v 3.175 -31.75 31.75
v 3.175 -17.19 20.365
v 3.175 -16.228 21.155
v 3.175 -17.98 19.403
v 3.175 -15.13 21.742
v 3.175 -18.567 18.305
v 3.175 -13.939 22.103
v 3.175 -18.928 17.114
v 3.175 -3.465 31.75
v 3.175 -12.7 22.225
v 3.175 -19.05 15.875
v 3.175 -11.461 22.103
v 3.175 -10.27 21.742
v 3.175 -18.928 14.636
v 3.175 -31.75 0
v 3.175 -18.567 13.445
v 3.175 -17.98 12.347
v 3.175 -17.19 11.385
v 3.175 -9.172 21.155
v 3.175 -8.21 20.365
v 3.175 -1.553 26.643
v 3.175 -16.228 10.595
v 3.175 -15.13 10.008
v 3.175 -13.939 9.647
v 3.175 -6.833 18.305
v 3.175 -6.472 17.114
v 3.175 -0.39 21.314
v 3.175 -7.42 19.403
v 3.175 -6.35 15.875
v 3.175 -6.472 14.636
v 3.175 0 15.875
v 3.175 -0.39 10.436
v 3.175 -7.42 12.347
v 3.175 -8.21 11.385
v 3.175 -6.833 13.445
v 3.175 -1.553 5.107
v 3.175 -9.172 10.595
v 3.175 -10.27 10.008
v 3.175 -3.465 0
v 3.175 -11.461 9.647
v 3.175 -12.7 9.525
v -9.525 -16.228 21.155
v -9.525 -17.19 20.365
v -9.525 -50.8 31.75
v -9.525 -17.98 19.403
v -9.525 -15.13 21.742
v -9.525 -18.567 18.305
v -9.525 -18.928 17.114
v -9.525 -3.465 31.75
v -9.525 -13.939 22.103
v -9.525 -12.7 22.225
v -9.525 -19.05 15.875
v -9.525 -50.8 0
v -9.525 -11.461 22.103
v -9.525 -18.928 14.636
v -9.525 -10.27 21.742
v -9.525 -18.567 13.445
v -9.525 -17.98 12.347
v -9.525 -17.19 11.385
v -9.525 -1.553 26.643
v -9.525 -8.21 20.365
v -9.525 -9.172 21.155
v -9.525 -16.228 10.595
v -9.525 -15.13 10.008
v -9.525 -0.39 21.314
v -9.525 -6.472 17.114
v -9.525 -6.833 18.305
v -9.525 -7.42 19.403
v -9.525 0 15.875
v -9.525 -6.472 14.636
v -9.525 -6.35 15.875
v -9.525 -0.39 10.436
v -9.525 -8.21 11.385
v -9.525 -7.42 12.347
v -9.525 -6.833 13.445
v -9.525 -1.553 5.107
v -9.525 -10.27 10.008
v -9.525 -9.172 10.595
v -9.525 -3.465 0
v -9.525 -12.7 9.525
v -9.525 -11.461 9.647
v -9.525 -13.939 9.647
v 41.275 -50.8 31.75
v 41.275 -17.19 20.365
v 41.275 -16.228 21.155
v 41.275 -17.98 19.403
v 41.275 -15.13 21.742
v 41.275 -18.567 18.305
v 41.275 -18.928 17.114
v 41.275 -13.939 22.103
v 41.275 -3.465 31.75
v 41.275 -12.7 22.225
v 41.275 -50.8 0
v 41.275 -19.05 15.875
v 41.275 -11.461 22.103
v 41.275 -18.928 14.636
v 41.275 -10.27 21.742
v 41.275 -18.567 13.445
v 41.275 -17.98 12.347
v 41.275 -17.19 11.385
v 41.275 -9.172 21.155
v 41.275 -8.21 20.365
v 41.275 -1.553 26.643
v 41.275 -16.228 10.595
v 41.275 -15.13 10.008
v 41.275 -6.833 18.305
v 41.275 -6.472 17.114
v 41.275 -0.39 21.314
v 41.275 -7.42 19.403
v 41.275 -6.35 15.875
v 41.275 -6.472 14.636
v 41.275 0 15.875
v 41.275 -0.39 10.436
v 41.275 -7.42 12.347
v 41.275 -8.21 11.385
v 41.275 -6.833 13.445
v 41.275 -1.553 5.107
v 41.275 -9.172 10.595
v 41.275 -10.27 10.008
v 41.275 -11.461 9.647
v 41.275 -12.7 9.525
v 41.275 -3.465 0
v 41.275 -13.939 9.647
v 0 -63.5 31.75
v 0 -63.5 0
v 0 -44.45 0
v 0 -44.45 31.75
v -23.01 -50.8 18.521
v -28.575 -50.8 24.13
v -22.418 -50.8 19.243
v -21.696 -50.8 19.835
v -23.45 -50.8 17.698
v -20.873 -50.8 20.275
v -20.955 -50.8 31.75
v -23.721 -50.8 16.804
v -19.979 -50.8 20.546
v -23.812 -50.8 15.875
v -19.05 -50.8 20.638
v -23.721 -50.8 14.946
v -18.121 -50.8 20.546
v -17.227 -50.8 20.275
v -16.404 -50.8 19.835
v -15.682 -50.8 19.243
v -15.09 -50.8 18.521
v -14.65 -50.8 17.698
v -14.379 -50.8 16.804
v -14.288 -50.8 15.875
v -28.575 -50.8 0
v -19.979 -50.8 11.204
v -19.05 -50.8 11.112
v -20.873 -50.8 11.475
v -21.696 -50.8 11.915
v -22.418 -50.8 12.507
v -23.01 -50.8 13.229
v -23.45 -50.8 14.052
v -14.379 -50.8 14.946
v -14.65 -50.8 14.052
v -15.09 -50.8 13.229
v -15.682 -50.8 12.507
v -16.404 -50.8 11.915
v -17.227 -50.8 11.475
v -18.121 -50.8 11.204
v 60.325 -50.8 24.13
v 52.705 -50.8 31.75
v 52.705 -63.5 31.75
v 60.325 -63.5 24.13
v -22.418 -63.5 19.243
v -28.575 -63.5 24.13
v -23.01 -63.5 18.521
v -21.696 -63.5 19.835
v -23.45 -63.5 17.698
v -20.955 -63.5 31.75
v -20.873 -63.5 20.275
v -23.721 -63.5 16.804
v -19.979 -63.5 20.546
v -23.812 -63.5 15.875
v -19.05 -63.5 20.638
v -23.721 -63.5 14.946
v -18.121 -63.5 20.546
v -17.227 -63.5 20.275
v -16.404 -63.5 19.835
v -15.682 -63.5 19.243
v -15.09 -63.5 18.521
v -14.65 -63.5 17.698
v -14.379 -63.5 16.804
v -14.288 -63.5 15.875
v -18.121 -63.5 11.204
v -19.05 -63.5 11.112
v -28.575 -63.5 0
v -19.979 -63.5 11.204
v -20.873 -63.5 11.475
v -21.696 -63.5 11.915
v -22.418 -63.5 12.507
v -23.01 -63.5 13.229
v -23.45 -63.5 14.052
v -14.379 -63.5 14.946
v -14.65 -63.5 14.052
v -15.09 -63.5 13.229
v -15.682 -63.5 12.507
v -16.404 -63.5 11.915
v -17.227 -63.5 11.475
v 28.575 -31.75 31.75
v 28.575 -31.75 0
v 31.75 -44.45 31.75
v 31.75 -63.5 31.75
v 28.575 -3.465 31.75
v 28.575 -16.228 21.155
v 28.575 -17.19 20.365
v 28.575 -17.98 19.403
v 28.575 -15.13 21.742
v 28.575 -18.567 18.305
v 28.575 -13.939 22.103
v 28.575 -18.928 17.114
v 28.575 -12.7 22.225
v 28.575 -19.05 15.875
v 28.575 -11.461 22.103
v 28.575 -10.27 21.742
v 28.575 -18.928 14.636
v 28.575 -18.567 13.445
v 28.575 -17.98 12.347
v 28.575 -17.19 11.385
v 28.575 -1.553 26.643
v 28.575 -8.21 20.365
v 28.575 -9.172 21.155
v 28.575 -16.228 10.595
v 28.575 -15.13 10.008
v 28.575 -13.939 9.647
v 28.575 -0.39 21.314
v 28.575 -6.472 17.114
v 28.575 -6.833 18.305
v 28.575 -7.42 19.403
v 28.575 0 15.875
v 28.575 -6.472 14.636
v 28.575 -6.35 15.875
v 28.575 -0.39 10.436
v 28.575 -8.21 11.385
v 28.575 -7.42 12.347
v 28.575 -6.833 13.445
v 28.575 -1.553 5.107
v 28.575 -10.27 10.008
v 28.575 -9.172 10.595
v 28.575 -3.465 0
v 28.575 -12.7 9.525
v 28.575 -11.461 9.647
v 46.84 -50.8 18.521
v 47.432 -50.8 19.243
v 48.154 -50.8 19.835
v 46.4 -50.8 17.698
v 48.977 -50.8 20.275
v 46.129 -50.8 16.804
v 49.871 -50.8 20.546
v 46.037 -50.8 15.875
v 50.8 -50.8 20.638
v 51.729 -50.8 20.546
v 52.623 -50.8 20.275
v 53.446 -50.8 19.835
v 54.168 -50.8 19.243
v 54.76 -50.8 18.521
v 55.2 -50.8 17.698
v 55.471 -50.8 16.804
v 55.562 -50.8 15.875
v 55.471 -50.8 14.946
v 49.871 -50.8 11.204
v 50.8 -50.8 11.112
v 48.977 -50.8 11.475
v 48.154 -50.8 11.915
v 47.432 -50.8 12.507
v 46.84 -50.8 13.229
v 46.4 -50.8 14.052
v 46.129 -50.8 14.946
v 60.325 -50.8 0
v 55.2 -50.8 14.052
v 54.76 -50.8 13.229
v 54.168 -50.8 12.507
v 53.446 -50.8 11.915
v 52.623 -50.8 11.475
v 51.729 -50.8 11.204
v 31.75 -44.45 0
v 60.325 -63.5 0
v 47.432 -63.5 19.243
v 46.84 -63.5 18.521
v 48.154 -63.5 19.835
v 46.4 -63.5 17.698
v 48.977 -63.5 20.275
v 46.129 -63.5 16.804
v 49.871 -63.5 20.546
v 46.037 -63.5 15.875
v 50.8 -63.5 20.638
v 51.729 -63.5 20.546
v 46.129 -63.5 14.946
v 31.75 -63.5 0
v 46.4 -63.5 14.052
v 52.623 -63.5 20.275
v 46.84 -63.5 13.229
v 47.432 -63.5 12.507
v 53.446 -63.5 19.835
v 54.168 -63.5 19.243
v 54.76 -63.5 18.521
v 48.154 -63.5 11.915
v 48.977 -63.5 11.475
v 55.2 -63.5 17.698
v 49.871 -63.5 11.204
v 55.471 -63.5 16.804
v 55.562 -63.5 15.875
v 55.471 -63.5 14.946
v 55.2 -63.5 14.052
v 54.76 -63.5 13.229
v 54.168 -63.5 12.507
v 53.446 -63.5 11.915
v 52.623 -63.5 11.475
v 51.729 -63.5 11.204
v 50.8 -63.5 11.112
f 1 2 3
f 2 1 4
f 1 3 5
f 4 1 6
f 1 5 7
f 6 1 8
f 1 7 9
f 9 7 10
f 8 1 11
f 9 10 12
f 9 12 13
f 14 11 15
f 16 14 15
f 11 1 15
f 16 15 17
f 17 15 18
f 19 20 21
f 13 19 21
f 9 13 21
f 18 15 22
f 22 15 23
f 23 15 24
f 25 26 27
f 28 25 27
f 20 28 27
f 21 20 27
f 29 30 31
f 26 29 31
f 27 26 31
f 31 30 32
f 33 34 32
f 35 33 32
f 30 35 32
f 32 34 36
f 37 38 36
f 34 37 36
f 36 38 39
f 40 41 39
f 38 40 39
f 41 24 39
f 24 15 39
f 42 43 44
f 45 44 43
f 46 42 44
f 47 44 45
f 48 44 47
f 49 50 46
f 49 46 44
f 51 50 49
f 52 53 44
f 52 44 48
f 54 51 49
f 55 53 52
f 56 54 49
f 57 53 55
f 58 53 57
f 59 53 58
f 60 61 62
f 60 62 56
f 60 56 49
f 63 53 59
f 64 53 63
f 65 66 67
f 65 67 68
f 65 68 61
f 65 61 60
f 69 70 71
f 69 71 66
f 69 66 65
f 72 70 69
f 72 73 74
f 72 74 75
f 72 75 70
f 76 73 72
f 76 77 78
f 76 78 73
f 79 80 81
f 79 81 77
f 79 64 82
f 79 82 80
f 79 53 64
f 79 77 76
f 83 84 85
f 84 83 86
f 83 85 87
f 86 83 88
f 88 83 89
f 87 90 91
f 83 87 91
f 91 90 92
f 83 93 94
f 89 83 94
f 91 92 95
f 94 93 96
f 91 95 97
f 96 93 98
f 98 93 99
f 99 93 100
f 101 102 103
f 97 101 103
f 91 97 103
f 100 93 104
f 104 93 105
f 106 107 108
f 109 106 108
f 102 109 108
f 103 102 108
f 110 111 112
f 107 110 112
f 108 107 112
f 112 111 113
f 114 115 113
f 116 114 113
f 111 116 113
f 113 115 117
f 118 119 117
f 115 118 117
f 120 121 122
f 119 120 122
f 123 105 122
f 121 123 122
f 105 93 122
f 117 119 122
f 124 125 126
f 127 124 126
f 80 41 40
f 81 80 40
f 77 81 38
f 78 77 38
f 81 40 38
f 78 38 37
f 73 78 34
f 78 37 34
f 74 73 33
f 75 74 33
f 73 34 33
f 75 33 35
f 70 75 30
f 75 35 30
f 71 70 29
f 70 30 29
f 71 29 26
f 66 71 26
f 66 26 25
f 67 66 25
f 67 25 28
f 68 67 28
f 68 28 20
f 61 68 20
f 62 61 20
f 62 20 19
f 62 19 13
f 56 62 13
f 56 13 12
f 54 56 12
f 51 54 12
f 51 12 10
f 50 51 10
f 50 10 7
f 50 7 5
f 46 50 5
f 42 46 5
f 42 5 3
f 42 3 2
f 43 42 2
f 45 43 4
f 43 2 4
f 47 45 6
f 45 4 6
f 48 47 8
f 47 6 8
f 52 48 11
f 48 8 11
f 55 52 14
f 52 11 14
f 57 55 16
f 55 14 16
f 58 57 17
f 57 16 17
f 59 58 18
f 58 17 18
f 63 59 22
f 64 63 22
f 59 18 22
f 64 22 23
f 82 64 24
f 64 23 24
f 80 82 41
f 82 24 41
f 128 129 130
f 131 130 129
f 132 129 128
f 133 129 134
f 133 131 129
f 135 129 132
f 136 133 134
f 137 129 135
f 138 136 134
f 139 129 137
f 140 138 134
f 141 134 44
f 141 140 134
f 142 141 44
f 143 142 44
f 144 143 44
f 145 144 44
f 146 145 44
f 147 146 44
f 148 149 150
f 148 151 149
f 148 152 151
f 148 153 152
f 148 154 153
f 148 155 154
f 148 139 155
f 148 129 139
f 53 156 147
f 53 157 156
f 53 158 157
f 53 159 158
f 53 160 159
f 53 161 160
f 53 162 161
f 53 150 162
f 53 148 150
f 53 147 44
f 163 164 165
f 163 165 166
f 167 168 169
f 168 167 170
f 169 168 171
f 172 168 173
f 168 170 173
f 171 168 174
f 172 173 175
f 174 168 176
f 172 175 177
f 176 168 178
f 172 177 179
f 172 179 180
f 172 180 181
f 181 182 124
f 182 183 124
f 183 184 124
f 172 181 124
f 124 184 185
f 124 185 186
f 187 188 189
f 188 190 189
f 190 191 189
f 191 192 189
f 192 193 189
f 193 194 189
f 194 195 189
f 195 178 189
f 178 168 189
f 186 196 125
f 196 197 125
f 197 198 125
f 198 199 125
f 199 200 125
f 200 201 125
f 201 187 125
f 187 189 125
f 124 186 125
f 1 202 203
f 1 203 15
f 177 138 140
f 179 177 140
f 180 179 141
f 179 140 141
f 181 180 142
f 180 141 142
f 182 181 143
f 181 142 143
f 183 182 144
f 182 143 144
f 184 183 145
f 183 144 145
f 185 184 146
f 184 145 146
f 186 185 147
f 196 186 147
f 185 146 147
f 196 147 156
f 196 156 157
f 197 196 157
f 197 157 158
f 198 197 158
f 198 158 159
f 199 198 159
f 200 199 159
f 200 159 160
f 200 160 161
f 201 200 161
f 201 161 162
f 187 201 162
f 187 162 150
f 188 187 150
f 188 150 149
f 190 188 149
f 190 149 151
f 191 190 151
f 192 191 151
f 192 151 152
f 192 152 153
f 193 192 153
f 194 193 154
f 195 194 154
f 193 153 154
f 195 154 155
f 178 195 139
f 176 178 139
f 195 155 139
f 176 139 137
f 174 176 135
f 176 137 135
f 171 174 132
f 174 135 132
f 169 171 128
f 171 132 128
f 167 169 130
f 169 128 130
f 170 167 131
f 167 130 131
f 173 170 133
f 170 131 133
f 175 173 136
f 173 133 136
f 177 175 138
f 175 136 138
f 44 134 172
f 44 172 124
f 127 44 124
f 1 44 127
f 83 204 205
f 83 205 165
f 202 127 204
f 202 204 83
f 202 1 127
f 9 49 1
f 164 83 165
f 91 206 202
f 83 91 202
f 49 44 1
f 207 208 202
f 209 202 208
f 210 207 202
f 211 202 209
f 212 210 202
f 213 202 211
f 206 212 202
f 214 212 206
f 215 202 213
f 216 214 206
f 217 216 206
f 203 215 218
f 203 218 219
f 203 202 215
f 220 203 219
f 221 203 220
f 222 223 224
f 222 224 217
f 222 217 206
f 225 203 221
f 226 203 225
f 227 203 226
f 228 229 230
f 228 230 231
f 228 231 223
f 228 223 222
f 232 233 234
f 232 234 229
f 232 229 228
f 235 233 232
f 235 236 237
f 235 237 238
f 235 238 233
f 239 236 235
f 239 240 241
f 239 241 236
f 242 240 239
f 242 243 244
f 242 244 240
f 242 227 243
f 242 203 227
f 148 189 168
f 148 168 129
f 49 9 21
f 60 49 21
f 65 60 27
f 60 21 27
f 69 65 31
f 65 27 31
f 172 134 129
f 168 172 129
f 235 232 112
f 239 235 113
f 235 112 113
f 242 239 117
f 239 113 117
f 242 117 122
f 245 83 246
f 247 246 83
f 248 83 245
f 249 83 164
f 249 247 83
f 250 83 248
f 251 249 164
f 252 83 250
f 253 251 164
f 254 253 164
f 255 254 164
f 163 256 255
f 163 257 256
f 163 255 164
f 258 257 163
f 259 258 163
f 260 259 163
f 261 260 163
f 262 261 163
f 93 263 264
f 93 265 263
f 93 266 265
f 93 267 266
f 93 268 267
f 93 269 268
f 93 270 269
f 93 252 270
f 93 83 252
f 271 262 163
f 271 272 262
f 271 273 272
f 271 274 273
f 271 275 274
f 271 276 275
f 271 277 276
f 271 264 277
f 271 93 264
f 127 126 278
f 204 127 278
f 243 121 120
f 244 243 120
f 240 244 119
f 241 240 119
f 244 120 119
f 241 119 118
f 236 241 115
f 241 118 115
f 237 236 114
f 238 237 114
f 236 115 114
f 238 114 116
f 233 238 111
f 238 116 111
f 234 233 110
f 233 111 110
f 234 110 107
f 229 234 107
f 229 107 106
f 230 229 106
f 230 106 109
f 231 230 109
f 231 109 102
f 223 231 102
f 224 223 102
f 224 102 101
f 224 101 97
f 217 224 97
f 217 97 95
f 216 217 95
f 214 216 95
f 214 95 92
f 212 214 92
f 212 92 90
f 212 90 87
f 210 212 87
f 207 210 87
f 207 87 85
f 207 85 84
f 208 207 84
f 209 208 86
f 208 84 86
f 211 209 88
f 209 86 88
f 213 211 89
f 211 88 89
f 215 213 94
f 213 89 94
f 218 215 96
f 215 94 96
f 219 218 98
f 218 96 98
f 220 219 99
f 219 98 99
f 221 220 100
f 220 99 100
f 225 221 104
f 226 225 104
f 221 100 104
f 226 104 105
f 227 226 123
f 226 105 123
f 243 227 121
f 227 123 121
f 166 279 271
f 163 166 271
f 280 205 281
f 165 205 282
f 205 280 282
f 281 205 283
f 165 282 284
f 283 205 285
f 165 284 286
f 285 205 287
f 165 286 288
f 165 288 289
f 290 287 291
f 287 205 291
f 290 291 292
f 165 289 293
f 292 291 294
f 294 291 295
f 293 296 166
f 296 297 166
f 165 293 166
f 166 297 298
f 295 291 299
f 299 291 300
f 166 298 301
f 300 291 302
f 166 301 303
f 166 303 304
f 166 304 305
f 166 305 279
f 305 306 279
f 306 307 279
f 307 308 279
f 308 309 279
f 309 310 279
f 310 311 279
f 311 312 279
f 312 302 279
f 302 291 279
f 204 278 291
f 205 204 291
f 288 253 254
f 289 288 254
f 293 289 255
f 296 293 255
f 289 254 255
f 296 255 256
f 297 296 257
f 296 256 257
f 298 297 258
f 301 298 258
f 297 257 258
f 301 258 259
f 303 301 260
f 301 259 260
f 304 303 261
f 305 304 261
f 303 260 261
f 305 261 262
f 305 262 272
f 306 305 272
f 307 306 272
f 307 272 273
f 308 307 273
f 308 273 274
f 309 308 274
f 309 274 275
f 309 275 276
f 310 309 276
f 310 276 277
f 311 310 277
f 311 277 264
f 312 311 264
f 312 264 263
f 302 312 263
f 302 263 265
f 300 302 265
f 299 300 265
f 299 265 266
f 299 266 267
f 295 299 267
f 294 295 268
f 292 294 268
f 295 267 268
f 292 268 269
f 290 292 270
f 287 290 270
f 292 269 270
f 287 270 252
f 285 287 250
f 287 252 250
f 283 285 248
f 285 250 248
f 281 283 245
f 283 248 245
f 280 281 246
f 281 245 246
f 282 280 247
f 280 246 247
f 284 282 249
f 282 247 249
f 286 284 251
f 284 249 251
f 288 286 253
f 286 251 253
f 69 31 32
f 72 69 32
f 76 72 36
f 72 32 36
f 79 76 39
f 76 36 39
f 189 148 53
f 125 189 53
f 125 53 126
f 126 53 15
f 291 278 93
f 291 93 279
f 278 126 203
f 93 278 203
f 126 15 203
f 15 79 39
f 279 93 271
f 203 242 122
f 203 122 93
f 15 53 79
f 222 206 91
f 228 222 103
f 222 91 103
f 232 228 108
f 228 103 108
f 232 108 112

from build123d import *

# Parameters (mm, degrees)
SKETCH1_W           = 19.05
SKETCH1_H           = 12.7
SKETCH1_W_2         = 9.525
SKETCH1_H_2         = 63.5
SKETCH1_W_3         = 3.175
SKETCH1_H_3         = 31.75
BOSS_EXTRUDE1_DEPTH = 31.75
CUT_EXTRUDE1_DEPTH  = 31.75
SKETCH3_R           = 4.7625
CUT_EXTRUDE2_DEPTH  = 31.75
SKETCH4_R           = 6.35
CUT_EXTRUDE3_DEPTH  = 100.595858348


with BuildPart() as part:
    # Sketch1 → Boss-Extrude1 (new body)
    with BuildSketch(Plane.XY):
        with Locations((-19.05, -57.15)):
            Rectangle(SKETCH1_W, SKETCH1_H)
        with Locations((-4.7625, -31.75)):
            Rectangle(SKETCH1_W_2, SKETCH1_H_2)
        with Locations((1.5875, -15.875)):
            Rectangle(SKETCH1_W_3, SKETCH1_H_3)
        Polygon((3.175, -31.75), (0, -31.75), (0, -44.45), (31.75, -44.45), (31.75, -31.75), (28.575, -31.75), align=None)
        with Locations((30.1625, -15.875)):
            Rectangle(SKETCH1_W_3, SKETCH1_H_3)
        Polygon((31.75, -31.75), (31.75, -44.45), (31.75, -63.5), (41.275, -63.5), (41.275, -50.8), (41.275, 0), (31.75, 0), align=None)
        with Locations((50.8, -57.15)):
            Rectangle(SKETCH1_W, SKETCH1_H)
    extrude(amount=BOSS_EXTRUDE1_DEPTH)

    # Sketch2 → Cut-Extrude1 (cut)
    with BuildSketch(Plane(origin=(0, -50.8, 0), x_dir=(1, 0, 0), z_dir=(0, 1, 0))):
        Polygon((-20.955, -31.75), (-28.575, -24.13), (-28.575, -31.75), align=None)
        Polygon((52.705, -31.75), (60.325, -24.13), (60.325, -31.75), align=None)
    extrude(amount=-CUT_EXTRUDE1_DEPTH, mode=Mode.SUBTRACT)

    # Sketch3 → Cut-Extrude2 (cut)
    with BuildSketch(Plane(origin=(0, -50.8, 0), x_dir=(1, 0, 0), z_dir=(0, 1, 0))):
        with Locations(Location((-19.05, -15.875, 0), (0, 0, 270))):
            Circle(SKETCH3_R)
        with Locations(Location((50.8, -15.875, 0), (0, 0, 270))):
            Circle(SKETCH3_R)
    extrude(amount=-CUT_EXTRUDE2_DEPTH, mode=Mode.SUBTRACT)

    # Sketch4 → Cut-Extrude3 (cut, through all)
    with BuildSketch(Plane(origin=(41.275, 0, 0), x_dir=(0, 0, -1), z_dir=(1, 0, 0))):
        with Locations((-15.875, -12.7)):
            Circle(SKETCH4_R)
        with BuildLine():
            Line((0, 0), (-15.875, 0))
            ThreePointArc((-15.875, 0), (-7.750642571, -0.876286908), (0, -3.464839036))
            Line((0, -3.464839036), (0, 0))
        make_face()
        with BuildLine():
            Line((-15.875, 0), (-31.75, 0))
            Line((-31.75, 0), (-31.75, -3.464839036))
            ThreePointArc((-31.75, -3.464839036), (-23.999357429, -0.876286908), (-15.875, 0))
        make_face()
    extrude(amount=-CUT_EXTRUDE3_DEPTH, mode=Mode.SUBTRACT)


solid = part.part
